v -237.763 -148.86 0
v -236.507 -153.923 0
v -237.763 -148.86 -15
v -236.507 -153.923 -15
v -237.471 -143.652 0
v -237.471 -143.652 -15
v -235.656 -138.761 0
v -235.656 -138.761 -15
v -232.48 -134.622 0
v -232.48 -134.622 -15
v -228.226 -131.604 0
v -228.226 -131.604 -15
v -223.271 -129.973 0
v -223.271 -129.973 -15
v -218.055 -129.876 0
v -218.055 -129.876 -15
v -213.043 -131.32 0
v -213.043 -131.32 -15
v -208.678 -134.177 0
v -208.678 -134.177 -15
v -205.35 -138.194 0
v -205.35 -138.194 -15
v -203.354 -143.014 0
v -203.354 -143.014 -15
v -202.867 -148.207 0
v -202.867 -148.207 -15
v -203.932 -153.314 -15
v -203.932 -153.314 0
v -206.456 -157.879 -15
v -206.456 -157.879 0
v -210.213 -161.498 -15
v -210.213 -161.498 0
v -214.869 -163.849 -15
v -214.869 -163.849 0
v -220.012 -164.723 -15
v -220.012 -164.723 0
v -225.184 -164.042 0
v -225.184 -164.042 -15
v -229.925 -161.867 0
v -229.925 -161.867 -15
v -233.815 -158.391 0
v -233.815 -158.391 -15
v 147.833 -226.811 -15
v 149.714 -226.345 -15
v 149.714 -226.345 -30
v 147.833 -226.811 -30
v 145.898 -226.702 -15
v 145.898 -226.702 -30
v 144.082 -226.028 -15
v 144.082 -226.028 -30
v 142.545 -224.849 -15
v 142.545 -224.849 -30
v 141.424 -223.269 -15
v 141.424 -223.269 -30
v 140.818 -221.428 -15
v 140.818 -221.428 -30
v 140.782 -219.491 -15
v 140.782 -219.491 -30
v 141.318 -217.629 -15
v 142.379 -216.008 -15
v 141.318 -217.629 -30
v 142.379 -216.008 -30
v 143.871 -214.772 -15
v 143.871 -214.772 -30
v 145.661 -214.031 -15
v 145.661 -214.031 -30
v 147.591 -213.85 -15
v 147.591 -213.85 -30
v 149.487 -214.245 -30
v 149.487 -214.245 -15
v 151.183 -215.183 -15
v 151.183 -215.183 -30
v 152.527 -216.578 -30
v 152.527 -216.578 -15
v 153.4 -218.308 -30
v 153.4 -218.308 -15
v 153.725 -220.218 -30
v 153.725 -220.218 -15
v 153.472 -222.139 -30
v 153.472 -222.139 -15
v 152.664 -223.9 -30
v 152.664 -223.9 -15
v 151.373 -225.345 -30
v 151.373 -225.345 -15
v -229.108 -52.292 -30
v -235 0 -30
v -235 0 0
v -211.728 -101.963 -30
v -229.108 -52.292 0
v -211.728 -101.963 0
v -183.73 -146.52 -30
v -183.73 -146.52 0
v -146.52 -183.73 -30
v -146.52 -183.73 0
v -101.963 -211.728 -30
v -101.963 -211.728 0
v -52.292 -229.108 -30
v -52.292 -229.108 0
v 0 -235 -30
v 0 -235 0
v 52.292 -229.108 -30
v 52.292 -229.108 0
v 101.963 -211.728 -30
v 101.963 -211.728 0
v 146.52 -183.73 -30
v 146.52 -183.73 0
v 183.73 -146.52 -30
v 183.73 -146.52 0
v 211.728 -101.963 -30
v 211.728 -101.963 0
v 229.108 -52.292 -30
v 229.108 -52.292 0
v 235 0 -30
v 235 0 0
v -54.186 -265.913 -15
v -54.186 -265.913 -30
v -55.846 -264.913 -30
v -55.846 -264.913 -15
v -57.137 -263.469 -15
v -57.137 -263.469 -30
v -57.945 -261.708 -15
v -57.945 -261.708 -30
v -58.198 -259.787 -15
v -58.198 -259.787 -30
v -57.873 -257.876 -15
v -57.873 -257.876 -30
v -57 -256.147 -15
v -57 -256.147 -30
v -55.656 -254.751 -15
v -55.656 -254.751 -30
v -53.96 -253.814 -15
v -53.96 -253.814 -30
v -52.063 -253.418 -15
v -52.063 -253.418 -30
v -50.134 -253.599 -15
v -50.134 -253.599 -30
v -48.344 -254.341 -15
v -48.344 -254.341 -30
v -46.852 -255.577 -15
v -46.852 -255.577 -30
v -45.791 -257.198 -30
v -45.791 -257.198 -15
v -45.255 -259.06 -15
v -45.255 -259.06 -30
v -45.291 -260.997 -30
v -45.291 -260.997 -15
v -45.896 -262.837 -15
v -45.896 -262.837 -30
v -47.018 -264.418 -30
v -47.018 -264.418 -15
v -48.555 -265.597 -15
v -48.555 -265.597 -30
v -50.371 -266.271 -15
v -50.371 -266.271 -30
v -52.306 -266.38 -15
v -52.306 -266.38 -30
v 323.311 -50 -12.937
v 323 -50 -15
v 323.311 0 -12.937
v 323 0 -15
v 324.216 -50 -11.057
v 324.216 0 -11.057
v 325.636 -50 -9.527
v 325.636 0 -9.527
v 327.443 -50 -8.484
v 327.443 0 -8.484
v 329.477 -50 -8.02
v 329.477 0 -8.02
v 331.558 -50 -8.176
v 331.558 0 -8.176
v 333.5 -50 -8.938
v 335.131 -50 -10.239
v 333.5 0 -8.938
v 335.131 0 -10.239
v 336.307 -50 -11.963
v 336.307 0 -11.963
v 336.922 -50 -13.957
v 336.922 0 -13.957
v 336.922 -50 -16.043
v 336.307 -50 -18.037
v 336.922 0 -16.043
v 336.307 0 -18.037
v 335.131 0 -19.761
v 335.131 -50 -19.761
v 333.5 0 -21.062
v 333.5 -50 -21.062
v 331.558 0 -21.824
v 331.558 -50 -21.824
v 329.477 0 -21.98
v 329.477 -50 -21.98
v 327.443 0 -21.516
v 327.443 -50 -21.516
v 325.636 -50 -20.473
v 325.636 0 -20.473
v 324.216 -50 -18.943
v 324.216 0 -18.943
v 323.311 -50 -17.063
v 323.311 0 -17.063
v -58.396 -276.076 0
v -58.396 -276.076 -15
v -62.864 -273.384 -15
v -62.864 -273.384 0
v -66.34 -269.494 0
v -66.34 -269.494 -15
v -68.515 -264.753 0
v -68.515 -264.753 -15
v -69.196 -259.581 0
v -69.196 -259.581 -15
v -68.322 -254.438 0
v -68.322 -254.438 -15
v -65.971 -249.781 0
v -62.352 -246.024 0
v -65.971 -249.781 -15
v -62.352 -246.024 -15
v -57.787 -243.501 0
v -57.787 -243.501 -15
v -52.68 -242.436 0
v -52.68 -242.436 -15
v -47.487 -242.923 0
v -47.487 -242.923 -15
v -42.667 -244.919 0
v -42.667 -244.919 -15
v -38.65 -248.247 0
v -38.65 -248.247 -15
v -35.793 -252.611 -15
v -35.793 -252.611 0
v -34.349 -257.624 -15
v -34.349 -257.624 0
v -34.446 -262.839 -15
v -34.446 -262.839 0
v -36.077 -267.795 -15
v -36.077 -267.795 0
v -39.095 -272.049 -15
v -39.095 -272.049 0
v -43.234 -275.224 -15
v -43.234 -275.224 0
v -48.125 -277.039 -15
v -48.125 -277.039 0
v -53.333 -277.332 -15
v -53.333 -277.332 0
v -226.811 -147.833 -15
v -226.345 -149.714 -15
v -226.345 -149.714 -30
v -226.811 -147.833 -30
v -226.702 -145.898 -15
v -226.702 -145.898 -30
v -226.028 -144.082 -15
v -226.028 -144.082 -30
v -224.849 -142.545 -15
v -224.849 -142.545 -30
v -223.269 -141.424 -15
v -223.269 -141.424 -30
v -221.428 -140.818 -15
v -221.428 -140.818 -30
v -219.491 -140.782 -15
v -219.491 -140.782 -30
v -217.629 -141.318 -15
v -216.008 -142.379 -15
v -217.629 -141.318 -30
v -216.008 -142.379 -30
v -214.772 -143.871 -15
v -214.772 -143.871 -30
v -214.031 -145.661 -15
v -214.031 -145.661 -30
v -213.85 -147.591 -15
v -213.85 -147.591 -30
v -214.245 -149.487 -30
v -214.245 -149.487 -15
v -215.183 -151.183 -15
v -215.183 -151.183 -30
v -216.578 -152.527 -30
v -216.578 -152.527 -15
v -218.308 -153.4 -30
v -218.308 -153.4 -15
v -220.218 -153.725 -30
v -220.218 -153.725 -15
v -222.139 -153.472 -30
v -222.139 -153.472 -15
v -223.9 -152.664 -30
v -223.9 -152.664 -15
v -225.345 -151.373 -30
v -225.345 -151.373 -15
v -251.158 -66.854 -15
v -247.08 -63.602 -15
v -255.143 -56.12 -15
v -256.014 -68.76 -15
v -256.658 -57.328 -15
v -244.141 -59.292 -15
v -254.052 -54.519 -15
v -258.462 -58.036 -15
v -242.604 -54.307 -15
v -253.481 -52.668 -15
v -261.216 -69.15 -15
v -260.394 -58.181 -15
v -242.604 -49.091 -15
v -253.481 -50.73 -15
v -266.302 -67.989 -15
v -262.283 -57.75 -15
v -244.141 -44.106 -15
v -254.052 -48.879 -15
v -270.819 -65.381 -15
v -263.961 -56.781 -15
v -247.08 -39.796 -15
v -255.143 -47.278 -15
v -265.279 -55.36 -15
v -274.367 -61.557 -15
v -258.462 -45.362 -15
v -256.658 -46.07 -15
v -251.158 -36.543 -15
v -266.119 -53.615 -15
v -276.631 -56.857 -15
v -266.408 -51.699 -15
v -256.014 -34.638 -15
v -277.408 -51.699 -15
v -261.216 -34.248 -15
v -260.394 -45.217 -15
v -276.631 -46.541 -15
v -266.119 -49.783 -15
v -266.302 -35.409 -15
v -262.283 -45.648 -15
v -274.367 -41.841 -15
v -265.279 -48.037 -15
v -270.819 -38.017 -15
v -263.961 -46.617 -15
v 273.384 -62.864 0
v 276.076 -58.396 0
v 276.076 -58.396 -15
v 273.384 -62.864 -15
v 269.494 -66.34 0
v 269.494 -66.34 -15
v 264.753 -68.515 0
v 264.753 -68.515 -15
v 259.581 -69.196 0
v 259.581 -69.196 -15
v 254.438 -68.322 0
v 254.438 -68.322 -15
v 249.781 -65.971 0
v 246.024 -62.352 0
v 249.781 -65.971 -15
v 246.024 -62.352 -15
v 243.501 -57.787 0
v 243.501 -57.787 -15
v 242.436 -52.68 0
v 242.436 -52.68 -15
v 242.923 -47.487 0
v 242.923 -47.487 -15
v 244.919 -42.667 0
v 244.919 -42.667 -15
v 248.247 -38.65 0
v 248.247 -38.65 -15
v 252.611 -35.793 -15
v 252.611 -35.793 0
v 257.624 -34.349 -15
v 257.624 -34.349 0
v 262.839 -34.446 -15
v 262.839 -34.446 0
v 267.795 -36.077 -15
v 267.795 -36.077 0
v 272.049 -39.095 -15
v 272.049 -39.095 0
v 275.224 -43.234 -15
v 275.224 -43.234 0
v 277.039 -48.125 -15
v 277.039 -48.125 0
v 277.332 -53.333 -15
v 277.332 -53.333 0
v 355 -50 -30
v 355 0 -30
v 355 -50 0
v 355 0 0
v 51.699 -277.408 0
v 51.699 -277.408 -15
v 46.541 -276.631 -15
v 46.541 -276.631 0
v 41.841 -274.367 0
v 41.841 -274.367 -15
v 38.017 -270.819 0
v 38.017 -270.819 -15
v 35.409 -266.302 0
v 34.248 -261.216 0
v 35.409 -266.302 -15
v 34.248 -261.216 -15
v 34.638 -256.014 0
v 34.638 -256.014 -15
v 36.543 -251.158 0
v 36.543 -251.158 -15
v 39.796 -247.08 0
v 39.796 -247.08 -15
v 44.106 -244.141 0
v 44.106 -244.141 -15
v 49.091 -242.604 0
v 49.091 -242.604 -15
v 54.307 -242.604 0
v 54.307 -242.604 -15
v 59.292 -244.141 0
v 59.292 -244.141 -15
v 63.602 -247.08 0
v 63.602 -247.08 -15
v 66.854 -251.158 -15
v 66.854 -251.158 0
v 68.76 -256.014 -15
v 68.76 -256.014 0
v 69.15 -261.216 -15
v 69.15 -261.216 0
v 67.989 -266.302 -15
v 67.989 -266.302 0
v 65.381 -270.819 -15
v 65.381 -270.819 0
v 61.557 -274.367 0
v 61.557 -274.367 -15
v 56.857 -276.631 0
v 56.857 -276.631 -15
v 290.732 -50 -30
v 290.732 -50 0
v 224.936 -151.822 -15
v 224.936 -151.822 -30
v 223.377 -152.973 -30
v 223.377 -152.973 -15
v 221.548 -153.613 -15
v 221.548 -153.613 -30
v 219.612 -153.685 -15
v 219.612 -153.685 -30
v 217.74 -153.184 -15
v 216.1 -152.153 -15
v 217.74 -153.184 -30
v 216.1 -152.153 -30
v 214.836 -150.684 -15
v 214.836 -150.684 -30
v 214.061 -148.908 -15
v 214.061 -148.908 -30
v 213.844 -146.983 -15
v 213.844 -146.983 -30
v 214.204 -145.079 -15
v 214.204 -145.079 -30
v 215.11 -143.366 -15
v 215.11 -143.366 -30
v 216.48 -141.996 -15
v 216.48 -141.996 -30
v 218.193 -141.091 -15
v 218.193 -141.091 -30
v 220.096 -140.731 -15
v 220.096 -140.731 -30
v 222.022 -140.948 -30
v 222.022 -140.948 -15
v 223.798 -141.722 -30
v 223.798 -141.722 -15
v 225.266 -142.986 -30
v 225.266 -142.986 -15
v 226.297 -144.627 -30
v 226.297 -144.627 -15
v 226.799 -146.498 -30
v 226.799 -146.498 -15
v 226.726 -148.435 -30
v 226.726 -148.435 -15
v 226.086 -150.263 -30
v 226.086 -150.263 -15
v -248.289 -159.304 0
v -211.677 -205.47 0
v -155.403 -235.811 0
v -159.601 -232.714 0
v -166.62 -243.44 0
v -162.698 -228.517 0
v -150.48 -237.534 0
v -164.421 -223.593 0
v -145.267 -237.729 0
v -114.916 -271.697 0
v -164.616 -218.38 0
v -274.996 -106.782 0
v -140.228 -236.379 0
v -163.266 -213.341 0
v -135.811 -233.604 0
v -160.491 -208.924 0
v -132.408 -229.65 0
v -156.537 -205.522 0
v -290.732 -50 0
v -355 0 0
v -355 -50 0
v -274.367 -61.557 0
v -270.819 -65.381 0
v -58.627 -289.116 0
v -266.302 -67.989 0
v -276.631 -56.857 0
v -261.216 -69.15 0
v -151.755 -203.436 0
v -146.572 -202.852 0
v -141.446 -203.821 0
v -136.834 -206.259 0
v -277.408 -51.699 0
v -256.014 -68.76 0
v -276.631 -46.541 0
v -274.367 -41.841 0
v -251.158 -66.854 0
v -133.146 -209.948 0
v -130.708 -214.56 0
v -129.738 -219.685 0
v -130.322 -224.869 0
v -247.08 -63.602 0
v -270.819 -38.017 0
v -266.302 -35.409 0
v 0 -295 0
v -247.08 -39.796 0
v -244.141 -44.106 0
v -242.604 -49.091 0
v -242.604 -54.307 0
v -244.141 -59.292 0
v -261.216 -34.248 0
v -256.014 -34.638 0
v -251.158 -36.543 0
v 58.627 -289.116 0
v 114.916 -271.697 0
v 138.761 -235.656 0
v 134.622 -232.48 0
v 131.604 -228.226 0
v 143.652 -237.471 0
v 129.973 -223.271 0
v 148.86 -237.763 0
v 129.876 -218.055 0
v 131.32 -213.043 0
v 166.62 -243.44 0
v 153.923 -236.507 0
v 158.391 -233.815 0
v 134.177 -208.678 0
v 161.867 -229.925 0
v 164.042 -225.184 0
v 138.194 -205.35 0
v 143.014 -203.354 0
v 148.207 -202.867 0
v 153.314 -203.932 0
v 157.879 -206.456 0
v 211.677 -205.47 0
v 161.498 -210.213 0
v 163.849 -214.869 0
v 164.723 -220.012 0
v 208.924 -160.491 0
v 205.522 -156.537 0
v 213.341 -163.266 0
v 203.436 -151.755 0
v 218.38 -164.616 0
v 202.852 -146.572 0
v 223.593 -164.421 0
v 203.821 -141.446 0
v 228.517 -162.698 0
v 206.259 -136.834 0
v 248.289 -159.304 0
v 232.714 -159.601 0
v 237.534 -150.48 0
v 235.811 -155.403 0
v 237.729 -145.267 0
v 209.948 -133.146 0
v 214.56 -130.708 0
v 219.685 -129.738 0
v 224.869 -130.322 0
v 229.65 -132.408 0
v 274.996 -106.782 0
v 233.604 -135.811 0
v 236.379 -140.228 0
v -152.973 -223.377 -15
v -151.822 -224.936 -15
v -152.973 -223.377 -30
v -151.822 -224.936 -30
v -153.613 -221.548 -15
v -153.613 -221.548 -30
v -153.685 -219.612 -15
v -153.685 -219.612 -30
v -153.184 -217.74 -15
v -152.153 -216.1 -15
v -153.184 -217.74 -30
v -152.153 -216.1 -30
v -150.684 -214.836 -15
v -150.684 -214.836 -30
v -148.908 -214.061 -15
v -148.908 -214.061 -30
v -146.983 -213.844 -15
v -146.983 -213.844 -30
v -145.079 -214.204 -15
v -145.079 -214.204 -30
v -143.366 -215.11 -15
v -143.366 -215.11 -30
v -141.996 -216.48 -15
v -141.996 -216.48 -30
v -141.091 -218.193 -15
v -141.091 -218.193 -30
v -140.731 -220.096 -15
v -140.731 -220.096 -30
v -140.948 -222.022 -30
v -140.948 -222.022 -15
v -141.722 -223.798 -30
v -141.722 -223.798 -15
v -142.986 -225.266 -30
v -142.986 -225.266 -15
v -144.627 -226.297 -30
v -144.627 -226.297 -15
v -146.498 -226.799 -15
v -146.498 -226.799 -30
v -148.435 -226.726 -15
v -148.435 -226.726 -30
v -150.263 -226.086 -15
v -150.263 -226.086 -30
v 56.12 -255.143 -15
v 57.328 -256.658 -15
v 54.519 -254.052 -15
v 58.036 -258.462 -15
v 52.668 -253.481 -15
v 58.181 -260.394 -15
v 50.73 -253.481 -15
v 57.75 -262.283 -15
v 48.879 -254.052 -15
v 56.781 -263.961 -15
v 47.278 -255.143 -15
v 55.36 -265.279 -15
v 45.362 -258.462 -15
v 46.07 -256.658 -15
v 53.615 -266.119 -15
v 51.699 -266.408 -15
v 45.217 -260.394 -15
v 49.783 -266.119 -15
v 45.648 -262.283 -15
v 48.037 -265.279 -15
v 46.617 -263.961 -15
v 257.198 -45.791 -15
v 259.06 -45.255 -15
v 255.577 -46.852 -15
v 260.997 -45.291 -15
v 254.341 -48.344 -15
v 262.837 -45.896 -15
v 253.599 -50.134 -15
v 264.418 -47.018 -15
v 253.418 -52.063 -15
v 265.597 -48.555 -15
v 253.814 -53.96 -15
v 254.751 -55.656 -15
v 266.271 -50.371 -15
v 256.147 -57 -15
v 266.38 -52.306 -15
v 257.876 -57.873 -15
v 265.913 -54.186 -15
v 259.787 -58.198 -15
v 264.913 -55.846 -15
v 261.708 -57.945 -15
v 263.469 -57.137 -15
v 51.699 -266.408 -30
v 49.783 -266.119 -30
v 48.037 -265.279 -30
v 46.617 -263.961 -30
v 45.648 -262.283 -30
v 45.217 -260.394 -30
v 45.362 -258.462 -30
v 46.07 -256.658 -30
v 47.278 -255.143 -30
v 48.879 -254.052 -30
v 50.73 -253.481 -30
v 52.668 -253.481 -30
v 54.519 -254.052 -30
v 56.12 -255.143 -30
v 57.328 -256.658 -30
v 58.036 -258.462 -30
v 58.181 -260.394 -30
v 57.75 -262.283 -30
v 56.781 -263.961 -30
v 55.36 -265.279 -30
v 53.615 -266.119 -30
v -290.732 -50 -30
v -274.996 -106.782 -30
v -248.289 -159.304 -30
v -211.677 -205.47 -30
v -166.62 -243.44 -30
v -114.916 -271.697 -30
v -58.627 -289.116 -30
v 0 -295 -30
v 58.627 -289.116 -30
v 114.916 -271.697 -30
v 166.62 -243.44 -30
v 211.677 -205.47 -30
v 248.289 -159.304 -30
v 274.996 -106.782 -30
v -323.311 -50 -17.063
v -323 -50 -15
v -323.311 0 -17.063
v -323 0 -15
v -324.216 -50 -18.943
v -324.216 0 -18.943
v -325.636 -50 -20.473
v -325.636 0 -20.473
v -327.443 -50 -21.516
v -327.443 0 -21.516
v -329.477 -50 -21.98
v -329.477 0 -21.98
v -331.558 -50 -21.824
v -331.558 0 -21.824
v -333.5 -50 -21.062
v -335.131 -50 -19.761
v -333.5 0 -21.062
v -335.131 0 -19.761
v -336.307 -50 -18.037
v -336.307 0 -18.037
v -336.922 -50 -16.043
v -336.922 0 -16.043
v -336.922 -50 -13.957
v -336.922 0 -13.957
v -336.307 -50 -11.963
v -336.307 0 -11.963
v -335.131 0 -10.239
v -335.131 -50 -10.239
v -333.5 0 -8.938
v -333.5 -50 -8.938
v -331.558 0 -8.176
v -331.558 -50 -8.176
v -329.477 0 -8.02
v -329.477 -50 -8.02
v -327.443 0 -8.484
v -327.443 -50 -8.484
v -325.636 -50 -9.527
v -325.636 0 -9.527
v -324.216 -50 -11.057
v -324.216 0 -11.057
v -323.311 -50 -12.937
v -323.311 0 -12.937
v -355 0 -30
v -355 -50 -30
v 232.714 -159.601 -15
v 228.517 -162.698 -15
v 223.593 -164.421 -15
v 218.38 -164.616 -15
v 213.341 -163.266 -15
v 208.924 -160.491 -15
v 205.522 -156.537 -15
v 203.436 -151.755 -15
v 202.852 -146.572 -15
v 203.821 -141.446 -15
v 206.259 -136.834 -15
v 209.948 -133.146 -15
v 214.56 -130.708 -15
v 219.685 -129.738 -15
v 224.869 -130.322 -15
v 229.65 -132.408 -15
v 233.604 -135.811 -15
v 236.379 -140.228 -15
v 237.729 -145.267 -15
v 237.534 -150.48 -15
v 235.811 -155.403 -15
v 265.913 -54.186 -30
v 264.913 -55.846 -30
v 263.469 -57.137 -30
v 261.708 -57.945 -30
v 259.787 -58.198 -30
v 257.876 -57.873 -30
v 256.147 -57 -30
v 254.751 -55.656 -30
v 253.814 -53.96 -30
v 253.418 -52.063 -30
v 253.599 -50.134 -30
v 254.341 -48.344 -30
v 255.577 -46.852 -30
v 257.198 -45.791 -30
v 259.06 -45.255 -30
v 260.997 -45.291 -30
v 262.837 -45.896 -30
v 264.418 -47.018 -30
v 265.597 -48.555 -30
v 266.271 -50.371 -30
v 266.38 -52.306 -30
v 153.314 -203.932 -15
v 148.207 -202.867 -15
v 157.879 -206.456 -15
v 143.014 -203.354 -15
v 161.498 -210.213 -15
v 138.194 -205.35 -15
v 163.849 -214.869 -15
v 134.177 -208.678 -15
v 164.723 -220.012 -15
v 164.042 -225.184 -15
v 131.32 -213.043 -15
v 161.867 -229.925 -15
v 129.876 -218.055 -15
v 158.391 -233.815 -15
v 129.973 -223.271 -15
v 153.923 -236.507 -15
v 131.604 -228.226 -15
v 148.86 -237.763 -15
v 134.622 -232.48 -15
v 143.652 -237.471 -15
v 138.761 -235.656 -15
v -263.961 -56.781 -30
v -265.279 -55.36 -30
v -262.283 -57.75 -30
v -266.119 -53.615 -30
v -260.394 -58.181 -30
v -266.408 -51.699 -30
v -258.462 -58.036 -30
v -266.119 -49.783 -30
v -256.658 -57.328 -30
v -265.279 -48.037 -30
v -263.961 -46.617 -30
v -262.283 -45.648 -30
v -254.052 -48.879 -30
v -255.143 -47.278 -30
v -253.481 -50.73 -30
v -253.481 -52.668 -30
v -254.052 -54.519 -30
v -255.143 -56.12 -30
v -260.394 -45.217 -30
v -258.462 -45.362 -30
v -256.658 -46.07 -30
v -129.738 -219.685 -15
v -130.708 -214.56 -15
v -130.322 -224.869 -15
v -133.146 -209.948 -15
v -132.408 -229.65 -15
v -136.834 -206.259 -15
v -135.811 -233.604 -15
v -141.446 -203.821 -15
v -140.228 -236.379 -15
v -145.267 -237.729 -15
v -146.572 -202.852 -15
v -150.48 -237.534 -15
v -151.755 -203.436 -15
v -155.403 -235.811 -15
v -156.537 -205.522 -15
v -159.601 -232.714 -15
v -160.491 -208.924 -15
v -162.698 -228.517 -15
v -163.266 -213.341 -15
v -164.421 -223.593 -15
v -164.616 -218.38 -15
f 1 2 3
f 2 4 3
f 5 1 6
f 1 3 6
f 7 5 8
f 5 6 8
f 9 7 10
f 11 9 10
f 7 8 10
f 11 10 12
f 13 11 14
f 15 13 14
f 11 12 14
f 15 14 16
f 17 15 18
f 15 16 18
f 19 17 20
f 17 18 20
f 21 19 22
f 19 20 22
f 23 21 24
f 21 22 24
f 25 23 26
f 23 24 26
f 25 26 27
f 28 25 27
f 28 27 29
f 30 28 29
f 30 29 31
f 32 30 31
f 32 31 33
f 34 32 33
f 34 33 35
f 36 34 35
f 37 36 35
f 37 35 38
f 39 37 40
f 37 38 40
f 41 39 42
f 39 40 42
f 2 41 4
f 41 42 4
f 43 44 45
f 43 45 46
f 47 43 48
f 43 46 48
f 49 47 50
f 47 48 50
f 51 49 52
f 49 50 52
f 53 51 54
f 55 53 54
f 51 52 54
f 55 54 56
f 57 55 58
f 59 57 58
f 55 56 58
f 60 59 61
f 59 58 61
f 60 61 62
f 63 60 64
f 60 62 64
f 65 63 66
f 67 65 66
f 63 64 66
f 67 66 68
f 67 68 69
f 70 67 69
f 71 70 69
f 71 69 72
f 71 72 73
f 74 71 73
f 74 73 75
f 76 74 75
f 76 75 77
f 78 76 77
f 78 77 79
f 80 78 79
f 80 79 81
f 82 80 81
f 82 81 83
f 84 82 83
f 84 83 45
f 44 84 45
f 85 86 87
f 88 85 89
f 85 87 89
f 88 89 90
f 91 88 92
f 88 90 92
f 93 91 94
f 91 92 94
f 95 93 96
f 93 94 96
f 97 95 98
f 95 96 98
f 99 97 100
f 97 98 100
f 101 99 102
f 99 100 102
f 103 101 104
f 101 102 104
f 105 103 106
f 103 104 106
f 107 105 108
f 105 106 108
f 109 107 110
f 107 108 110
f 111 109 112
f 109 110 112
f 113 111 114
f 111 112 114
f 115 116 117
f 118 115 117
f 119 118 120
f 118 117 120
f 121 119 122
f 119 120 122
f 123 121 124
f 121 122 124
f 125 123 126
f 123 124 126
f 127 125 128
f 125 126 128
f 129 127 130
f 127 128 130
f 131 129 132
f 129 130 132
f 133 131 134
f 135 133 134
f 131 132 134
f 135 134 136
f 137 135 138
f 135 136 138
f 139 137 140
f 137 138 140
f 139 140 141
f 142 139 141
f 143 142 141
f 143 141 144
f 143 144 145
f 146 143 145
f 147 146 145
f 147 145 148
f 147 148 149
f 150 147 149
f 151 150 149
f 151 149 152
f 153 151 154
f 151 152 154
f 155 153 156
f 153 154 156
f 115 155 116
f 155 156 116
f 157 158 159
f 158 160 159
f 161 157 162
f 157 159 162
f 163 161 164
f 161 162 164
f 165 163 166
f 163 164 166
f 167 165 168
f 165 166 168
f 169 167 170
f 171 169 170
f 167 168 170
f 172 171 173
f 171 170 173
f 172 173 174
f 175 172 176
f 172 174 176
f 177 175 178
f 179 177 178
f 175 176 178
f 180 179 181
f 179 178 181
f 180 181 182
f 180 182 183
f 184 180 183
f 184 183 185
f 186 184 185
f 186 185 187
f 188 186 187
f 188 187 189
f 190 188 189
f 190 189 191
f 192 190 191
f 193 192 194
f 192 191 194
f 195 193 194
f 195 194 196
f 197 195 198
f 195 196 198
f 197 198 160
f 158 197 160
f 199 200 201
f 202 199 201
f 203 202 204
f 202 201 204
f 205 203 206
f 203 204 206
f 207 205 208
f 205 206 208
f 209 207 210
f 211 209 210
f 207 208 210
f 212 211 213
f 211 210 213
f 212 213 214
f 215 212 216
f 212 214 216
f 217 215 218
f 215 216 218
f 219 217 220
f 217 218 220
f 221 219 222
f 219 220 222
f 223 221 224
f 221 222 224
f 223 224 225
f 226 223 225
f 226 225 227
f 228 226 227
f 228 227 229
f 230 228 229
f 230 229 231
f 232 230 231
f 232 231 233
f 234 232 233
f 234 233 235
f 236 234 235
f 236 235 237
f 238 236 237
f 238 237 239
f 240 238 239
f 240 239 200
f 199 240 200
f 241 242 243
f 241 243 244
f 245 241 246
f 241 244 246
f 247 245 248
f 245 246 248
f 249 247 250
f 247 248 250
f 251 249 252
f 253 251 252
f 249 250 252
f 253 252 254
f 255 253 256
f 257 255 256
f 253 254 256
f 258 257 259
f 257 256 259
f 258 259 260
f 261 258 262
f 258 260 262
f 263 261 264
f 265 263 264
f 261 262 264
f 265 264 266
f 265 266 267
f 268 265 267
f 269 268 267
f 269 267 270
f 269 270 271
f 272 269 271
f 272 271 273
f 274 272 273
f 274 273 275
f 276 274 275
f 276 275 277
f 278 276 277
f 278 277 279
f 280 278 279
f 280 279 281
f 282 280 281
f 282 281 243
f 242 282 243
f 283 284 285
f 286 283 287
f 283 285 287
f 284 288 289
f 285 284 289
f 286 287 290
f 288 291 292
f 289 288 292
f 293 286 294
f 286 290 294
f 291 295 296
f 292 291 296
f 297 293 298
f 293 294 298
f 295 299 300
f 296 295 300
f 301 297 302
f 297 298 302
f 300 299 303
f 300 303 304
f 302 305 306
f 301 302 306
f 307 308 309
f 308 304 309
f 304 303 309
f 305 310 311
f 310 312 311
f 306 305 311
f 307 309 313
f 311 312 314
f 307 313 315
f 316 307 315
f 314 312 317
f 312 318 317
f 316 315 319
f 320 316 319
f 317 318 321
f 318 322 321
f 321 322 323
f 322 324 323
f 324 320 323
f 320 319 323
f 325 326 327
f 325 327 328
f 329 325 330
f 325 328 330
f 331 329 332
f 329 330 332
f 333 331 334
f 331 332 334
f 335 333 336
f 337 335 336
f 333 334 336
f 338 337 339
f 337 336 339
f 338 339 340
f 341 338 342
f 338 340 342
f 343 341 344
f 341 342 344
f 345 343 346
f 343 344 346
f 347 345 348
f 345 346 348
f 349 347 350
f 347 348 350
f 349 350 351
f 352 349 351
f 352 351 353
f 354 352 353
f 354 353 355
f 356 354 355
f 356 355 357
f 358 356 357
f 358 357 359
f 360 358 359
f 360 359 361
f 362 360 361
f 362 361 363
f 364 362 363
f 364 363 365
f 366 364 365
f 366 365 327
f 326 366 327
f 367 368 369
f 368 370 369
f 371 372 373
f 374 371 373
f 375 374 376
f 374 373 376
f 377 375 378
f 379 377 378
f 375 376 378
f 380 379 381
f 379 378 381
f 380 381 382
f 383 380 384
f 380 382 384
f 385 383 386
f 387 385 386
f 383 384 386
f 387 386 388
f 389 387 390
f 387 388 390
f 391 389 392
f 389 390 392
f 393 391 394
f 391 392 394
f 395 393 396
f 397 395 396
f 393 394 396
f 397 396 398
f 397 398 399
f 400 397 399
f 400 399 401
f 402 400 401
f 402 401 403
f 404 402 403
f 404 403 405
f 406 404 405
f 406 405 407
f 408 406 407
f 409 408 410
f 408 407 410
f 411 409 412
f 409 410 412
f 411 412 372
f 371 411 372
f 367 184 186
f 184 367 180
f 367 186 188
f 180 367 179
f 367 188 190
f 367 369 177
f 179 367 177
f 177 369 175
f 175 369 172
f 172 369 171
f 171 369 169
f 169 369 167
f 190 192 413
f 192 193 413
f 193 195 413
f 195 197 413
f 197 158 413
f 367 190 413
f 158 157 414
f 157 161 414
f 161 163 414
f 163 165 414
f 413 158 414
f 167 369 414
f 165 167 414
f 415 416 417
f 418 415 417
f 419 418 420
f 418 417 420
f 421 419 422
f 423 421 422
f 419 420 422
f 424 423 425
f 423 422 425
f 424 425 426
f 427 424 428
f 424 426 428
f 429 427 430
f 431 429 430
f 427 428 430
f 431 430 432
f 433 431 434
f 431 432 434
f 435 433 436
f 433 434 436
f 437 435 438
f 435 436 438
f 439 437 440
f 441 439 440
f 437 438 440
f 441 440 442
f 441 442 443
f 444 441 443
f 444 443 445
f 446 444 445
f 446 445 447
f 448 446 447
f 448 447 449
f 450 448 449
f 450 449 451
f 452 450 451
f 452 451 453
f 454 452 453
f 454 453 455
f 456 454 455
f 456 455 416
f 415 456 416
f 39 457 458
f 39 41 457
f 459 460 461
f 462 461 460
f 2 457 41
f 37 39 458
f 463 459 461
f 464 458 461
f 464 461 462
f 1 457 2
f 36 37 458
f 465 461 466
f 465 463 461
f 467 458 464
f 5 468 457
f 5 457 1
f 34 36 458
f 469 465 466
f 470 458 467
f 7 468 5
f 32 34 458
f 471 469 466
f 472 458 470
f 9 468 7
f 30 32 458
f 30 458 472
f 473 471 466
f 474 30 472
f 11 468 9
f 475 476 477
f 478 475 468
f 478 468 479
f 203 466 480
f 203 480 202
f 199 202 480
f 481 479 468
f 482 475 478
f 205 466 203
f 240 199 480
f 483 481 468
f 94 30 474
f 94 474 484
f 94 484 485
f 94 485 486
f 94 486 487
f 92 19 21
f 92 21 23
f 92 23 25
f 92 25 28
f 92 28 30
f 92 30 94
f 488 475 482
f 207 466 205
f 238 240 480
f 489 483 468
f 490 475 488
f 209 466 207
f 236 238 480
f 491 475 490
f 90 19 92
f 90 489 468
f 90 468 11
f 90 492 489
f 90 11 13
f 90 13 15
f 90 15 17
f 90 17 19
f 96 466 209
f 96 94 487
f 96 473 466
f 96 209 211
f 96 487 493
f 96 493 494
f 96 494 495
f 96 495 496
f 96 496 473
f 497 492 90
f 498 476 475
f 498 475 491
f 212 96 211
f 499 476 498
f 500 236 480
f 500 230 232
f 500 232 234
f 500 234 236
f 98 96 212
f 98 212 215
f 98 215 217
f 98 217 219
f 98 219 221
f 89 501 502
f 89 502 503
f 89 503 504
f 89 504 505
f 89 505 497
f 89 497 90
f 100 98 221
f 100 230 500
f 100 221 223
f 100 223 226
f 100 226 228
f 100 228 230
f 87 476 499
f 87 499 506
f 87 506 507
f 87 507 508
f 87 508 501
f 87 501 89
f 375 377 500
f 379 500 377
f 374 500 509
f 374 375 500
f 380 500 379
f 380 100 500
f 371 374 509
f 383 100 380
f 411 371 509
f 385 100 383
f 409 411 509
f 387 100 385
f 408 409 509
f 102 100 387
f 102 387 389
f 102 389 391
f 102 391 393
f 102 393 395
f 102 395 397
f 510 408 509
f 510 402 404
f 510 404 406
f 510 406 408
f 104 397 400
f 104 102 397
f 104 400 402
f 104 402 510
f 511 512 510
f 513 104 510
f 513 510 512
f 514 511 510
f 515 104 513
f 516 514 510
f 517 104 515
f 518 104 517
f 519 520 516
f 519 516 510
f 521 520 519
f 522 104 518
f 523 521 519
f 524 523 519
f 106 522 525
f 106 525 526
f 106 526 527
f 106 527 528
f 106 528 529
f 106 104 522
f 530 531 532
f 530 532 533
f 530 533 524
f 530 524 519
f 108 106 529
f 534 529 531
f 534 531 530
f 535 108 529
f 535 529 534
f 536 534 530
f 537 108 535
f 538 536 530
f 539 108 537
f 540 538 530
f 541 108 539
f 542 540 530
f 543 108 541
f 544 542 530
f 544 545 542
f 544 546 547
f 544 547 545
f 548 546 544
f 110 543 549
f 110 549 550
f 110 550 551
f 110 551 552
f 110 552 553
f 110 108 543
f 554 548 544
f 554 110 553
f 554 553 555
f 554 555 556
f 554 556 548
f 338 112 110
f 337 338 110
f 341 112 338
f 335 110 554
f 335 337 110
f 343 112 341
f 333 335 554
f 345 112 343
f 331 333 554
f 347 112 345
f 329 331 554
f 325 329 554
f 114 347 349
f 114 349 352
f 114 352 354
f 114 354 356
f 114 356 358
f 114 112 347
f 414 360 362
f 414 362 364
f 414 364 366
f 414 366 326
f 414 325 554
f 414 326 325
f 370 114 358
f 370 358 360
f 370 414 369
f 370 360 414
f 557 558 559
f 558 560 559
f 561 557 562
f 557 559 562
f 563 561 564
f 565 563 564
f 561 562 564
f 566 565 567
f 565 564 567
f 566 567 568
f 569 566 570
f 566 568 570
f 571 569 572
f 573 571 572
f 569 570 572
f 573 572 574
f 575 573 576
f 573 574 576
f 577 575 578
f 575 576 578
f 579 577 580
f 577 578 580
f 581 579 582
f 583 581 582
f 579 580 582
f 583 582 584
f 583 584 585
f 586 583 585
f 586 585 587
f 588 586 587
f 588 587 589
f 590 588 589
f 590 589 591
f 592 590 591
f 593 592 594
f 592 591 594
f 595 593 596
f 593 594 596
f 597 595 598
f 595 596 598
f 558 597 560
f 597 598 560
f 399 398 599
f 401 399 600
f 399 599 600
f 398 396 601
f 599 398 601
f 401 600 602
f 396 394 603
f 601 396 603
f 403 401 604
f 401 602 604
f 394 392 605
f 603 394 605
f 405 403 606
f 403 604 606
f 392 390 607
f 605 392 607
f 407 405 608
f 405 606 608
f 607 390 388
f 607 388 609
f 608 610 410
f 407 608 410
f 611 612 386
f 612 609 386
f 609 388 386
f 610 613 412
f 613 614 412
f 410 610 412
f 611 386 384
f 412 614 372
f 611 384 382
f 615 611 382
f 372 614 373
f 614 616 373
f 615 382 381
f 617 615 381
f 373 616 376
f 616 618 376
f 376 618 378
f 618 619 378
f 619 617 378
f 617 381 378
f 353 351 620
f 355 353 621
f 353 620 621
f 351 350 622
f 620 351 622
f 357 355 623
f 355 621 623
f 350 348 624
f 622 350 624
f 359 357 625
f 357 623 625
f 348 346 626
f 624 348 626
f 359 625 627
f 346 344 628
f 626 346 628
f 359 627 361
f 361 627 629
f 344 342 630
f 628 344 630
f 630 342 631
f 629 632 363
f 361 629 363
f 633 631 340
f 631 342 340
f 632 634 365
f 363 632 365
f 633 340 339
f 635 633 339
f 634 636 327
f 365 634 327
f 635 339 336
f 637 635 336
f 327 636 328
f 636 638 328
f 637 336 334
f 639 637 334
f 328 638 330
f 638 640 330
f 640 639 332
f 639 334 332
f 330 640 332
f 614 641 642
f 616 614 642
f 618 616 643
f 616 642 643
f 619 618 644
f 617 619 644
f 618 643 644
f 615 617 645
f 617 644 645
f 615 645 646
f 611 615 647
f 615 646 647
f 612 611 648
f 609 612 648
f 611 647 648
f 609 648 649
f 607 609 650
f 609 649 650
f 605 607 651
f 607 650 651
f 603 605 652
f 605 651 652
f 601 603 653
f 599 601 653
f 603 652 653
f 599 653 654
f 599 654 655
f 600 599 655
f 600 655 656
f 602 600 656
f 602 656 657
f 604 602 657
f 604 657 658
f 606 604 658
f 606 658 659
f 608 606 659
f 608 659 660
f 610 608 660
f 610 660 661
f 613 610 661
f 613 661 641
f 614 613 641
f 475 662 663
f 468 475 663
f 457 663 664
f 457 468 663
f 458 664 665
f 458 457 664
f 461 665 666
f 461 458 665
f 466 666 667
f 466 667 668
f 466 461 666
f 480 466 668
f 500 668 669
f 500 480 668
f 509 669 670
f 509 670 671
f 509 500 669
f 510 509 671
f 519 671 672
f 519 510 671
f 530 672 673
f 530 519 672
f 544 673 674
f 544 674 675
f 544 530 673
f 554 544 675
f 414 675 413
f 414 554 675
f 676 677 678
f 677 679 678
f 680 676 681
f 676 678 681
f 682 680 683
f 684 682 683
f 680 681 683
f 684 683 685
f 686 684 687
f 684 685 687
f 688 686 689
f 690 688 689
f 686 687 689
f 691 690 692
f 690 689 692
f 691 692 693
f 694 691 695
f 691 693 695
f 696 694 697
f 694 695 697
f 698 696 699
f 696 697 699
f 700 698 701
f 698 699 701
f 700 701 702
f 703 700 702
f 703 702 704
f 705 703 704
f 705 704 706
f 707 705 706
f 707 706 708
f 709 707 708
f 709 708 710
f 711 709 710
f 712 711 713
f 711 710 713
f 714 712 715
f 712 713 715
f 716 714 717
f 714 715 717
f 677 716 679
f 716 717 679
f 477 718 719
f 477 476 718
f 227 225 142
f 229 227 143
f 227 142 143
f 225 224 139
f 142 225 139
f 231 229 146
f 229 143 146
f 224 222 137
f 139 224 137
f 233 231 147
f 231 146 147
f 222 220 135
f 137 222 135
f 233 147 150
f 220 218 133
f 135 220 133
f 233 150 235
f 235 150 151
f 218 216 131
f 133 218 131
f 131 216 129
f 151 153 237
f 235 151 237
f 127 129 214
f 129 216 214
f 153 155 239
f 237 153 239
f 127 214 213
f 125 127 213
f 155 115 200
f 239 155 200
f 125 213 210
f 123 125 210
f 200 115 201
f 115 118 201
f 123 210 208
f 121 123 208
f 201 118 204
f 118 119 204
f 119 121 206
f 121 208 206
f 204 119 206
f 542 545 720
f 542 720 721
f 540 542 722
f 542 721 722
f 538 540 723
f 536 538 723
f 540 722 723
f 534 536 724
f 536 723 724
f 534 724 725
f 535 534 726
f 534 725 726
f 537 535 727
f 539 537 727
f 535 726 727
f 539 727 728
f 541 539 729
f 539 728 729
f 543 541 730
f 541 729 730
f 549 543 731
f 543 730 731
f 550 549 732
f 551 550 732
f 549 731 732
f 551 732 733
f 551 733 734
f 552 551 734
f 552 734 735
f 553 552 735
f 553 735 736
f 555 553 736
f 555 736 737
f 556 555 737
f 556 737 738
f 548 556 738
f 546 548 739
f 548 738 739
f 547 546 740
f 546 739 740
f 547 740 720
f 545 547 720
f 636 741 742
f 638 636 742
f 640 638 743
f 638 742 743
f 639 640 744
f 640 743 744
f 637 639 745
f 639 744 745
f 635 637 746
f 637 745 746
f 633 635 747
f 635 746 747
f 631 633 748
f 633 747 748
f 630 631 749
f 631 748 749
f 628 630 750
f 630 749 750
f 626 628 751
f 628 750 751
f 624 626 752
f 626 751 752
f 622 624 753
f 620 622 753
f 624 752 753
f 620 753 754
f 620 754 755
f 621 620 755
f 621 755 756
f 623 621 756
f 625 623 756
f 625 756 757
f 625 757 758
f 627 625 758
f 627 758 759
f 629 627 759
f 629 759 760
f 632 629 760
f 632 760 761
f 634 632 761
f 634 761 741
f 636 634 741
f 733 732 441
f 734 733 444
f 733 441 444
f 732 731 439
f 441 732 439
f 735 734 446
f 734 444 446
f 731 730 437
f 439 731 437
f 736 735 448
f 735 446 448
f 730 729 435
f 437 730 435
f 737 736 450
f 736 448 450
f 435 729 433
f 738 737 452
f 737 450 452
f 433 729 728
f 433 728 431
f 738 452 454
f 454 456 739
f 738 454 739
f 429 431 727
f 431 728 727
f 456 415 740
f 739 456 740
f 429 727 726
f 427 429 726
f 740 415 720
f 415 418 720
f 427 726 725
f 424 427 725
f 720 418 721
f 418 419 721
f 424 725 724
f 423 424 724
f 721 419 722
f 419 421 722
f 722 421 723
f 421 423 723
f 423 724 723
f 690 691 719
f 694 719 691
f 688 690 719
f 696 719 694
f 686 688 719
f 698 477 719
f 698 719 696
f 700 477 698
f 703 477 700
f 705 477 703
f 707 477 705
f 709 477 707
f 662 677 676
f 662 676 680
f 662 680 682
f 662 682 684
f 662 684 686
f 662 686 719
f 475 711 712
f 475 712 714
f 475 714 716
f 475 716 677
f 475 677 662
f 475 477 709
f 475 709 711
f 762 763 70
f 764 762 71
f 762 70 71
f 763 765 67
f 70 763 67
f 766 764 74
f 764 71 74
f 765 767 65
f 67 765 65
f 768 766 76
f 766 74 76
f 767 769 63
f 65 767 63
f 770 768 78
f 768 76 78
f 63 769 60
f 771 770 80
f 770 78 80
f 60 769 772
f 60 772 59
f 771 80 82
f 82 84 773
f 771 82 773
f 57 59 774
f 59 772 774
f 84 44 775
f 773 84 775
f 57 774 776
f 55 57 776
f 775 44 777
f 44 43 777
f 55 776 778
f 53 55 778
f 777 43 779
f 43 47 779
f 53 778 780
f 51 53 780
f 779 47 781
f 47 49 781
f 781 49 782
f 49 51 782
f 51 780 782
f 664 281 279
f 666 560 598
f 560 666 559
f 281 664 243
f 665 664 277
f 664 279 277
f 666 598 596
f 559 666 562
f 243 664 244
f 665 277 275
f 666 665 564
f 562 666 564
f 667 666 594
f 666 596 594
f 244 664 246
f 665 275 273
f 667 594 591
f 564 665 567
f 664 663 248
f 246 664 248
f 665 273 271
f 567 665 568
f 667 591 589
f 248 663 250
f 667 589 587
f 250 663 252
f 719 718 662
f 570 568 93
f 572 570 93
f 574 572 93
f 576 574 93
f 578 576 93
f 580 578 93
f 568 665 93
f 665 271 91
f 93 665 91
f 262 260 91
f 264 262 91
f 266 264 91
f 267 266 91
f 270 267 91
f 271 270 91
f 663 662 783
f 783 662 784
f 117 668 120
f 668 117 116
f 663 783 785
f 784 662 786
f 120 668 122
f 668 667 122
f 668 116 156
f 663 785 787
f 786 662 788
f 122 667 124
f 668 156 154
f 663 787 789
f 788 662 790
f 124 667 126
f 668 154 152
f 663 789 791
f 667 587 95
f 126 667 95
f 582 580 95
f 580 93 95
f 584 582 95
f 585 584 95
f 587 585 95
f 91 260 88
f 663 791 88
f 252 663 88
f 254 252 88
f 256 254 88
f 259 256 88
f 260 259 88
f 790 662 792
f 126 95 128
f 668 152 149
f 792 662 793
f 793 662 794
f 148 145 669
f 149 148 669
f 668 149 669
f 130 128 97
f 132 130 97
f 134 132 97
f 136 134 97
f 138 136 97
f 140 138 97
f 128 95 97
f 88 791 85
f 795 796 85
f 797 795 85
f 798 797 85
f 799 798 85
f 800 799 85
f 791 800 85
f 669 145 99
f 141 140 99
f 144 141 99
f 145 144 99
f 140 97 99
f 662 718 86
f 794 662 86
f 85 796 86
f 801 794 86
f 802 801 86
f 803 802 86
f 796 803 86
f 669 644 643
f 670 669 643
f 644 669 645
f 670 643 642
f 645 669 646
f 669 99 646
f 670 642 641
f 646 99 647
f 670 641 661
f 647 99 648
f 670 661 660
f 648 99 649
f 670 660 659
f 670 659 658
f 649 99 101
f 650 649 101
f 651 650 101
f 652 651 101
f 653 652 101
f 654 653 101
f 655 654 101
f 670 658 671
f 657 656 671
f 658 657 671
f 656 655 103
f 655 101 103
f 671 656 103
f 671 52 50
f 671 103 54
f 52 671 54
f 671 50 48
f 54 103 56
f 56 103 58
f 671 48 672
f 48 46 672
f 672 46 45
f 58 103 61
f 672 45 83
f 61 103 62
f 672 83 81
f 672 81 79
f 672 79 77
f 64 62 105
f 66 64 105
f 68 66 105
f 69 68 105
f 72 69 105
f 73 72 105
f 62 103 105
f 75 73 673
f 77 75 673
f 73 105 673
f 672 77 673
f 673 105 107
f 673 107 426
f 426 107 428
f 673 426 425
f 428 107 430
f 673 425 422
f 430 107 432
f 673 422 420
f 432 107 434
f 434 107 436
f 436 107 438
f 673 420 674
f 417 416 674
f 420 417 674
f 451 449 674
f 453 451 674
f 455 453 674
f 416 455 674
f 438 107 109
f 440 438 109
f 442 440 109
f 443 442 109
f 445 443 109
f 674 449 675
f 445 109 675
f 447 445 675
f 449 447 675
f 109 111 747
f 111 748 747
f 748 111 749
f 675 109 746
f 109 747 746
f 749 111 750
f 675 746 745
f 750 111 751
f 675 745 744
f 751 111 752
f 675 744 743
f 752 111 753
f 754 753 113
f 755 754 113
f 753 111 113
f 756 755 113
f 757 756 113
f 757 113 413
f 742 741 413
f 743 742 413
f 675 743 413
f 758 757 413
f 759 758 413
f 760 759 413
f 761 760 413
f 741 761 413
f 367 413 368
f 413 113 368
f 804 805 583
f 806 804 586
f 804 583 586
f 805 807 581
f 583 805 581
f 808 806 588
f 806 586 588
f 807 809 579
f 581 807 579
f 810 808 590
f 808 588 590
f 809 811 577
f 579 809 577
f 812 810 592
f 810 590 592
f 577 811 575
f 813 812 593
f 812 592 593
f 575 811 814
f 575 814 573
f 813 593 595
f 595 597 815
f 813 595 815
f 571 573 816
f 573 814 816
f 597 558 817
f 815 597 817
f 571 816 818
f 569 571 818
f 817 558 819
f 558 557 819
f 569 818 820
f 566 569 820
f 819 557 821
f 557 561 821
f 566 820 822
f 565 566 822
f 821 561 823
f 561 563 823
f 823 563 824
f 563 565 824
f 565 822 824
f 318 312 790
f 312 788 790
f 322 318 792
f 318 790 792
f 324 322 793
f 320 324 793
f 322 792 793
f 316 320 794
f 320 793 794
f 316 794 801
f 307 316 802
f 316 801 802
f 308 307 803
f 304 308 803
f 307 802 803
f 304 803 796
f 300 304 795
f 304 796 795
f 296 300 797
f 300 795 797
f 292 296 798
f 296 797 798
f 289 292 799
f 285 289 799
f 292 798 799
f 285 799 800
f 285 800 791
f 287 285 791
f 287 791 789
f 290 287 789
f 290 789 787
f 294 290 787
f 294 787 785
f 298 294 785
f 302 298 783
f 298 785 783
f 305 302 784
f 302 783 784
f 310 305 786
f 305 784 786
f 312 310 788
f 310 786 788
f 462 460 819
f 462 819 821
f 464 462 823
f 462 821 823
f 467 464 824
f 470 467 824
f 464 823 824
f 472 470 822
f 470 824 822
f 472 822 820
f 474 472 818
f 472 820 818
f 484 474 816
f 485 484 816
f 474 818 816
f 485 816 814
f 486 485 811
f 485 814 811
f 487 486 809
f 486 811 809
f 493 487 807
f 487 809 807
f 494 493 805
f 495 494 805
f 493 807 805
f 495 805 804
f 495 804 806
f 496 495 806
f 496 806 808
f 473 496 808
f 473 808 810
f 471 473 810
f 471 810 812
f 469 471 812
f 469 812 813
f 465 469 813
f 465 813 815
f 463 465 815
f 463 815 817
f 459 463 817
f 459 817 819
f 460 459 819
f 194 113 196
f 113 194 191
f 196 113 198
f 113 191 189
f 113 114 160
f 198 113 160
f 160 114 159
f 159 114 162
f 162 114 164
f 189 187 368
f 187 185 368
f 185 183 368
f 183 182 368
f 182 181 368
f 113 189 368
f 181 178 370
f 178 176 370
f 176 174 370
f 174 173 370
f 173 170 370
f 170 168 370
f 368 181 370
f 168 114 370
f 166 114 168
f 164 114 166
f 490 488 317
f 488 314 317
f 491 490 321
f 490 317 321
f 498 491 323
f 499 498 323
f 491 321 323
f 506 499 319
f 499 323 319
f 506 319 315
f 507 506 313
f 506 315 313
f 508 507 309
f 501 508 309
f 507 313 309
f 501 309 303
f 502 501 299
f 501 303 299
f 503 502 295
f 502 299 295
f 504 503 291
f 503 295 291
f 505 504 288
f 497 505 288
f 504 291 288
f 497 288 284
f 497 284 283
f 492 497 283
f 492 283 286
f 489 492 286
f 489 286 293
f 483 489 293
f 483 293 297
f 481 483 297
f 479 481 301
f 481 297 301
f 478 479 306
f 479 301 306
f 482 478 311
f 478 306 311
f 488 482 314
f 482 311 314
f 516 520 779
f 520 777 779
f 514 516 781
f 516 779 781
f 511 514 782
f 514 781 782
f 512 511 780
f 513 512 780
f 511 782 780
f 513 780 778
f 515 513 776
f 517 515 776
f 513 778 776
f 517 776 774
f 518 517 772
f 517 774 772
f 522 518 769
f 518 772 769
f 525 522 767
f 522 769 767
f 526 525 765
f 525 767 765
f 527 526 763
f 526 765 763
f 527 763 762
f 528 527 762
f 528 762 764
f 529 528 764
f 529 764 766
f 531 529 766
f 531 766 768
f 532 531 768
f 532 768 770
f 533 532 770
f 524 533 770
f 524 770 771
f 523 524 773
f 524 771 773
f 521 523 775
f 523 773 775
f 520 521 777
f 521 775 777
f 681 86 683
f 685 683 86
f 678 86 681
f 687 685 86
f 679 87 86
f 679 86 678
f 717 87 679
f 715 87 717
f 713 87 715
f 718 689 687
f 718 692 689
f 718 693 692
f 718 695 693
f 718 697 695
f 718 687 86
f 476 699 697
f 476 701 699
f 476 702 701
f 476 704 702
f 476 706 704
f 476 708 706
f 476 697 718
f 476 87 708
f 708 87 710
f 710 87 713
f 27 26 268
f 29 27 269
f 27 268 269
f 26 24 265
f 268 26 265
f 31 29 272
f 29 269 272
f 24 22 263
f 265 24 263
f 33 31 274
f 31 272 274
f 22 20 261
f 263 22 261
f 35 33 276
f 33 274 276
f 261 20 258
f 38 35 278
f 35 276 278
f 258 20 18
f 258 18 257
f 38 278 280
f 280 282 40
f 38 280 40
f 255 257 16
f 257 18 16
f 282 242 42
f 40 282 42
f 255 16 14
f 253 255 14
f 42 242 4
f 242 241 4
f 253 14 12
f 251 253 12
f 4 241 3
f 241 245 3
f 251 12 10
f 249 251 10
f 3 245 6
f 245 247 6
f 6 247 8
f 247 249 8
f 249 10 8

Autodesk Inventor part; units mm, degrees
ref_plane "YZ Plane" through (0, 0, 0) normal (1, 0, 0) x (0, 1, 0)
ref_plane "XZ Plane" through (0, 0, 0) normal (0, 1, 0) x (-1, 0, 0)
ref_plane "XY Plane" through (0, 0, 0) normal (0, 0, 1) x (1, 0, 0)
sketch "Sketch1" plane through (0, 0, 0) normal (0, 0, 1) x (1, 0, 0)
  circle A0 centre (0, 0) radius 265 construction
  line L0 (0, 265) -> (0, 295) construction
  line L1 (0, 265) -> (0, 235) construction
  circle A1 centre (0, 0) radius 235
  circle A2 centre (0, 0) radius 295
  line L2 (-235, 0) -> (-235, 80) construction
  line L3 (-235, 80) -> (-295, 80) construction
  line L4 (-295, 80) -> (-295, 0) construction
  line L5 (235, 0) -> (235, 80) construction
  line L6 (235, 80) -> (295, 80) construction
  line L7 (295, 80) -> (295, 0) construction
  line L8 (-235, 0) -> (-295, 0)
  line L9 (-295, 0) -> (-355, 0)
  line L10 (-355, 0) -> (-355, -50)
  line L11 (-355, -50) -> (-290.7318, -50)
  line L12 (235, 0) -> (295, 0)
  line L13 (295, 0) -> (355, 0)
  line L14 (355, 0) -> (355, -50)
  line L15 (355, -50) -> (290.7318, -50)
  dimension "d13" = 530
  dimension "d26" = 80
  dimension "d36" = 60
  dimension "d40" = 60
  dimension "d41" = 50
extrude "Extrusion1" add sketch "Sketch1" against normal blind 30 contours L12 A2 L8 A1 | L13 L14 L15 A2 | A2 L11 L10 L9 picked at (3.5144, -274.7637)
sketch "Sketch4" plane through (0, 0, 0) normal (0, 0, 1) x (1, 0, 0)
  line L0 (0, 0) -> (51.6989, -259.9081) construction
  line L1 (0, 0) -> (0, -276.8337) construction
  dimension "d27" = 265
  dimension "d35" = 11.25
sketch "Sketch7" plane through (0, 0, 0) normal (0, 0, 1) x (1, 0, 0)
  line L0 (-355, -50) -> (-355, 0) construction
  line L1 (-355, -25) -> (355, -25) construction
  line L2 (355, 0) -> (355, -50) construction
  point P0 (0, 0)
  point P1 (-330, -25)
  dimension "d42" = 25
fillet "Fillet1" [suppressed]
hole "Hole1" [suppressed]
hole "Hole2" at (51.6989, -259.9081, 0) direction (0, 0, -1) diameter 13 end through all counterbore diameter 35 counterbore depth 15
pattern_circular "Circular Pattern4" count 9 over 180 about axis through (0, 0, -10) along (0, 0, -1) of "Hole2" both ways yes
mirror "Mirror1" [suppressed]
sketch "Sketch9" plane through (-355, 0, 0) normal (0, 1, 0) x (1, 0, 0)
  circle A0 centre (25, 15) radius 7
  line L0 (0, 0) -> (0, 30) projected
  point P0 (355, 0)
  point P1 (0, 15)
  dimension "d70" = 25
  dimension "d71" = 14
extrude "Extrusion8" cut sketch "Sketch9" against normal through all
mirror "Mirror2" about plane through (0, 0, 0) normal (1, 0, 0) of "Extrusion8"
equation "\"d13\" = Шпил_пласт_КОРМА_диам_центров"
equation "\"d40\" = d36"
equation "\"d27\" = 0.5 * Шпил_пласт_КОРМА_диам_центров"
equation "\"BendReliefDepth\" = 0.5 * Thickness"
equation "\"Шпил_пласт_КОРМА_диам_центров\" = 530"
equation "\"Thickness\" = 30"
properties part number "Постель 201 зад"
